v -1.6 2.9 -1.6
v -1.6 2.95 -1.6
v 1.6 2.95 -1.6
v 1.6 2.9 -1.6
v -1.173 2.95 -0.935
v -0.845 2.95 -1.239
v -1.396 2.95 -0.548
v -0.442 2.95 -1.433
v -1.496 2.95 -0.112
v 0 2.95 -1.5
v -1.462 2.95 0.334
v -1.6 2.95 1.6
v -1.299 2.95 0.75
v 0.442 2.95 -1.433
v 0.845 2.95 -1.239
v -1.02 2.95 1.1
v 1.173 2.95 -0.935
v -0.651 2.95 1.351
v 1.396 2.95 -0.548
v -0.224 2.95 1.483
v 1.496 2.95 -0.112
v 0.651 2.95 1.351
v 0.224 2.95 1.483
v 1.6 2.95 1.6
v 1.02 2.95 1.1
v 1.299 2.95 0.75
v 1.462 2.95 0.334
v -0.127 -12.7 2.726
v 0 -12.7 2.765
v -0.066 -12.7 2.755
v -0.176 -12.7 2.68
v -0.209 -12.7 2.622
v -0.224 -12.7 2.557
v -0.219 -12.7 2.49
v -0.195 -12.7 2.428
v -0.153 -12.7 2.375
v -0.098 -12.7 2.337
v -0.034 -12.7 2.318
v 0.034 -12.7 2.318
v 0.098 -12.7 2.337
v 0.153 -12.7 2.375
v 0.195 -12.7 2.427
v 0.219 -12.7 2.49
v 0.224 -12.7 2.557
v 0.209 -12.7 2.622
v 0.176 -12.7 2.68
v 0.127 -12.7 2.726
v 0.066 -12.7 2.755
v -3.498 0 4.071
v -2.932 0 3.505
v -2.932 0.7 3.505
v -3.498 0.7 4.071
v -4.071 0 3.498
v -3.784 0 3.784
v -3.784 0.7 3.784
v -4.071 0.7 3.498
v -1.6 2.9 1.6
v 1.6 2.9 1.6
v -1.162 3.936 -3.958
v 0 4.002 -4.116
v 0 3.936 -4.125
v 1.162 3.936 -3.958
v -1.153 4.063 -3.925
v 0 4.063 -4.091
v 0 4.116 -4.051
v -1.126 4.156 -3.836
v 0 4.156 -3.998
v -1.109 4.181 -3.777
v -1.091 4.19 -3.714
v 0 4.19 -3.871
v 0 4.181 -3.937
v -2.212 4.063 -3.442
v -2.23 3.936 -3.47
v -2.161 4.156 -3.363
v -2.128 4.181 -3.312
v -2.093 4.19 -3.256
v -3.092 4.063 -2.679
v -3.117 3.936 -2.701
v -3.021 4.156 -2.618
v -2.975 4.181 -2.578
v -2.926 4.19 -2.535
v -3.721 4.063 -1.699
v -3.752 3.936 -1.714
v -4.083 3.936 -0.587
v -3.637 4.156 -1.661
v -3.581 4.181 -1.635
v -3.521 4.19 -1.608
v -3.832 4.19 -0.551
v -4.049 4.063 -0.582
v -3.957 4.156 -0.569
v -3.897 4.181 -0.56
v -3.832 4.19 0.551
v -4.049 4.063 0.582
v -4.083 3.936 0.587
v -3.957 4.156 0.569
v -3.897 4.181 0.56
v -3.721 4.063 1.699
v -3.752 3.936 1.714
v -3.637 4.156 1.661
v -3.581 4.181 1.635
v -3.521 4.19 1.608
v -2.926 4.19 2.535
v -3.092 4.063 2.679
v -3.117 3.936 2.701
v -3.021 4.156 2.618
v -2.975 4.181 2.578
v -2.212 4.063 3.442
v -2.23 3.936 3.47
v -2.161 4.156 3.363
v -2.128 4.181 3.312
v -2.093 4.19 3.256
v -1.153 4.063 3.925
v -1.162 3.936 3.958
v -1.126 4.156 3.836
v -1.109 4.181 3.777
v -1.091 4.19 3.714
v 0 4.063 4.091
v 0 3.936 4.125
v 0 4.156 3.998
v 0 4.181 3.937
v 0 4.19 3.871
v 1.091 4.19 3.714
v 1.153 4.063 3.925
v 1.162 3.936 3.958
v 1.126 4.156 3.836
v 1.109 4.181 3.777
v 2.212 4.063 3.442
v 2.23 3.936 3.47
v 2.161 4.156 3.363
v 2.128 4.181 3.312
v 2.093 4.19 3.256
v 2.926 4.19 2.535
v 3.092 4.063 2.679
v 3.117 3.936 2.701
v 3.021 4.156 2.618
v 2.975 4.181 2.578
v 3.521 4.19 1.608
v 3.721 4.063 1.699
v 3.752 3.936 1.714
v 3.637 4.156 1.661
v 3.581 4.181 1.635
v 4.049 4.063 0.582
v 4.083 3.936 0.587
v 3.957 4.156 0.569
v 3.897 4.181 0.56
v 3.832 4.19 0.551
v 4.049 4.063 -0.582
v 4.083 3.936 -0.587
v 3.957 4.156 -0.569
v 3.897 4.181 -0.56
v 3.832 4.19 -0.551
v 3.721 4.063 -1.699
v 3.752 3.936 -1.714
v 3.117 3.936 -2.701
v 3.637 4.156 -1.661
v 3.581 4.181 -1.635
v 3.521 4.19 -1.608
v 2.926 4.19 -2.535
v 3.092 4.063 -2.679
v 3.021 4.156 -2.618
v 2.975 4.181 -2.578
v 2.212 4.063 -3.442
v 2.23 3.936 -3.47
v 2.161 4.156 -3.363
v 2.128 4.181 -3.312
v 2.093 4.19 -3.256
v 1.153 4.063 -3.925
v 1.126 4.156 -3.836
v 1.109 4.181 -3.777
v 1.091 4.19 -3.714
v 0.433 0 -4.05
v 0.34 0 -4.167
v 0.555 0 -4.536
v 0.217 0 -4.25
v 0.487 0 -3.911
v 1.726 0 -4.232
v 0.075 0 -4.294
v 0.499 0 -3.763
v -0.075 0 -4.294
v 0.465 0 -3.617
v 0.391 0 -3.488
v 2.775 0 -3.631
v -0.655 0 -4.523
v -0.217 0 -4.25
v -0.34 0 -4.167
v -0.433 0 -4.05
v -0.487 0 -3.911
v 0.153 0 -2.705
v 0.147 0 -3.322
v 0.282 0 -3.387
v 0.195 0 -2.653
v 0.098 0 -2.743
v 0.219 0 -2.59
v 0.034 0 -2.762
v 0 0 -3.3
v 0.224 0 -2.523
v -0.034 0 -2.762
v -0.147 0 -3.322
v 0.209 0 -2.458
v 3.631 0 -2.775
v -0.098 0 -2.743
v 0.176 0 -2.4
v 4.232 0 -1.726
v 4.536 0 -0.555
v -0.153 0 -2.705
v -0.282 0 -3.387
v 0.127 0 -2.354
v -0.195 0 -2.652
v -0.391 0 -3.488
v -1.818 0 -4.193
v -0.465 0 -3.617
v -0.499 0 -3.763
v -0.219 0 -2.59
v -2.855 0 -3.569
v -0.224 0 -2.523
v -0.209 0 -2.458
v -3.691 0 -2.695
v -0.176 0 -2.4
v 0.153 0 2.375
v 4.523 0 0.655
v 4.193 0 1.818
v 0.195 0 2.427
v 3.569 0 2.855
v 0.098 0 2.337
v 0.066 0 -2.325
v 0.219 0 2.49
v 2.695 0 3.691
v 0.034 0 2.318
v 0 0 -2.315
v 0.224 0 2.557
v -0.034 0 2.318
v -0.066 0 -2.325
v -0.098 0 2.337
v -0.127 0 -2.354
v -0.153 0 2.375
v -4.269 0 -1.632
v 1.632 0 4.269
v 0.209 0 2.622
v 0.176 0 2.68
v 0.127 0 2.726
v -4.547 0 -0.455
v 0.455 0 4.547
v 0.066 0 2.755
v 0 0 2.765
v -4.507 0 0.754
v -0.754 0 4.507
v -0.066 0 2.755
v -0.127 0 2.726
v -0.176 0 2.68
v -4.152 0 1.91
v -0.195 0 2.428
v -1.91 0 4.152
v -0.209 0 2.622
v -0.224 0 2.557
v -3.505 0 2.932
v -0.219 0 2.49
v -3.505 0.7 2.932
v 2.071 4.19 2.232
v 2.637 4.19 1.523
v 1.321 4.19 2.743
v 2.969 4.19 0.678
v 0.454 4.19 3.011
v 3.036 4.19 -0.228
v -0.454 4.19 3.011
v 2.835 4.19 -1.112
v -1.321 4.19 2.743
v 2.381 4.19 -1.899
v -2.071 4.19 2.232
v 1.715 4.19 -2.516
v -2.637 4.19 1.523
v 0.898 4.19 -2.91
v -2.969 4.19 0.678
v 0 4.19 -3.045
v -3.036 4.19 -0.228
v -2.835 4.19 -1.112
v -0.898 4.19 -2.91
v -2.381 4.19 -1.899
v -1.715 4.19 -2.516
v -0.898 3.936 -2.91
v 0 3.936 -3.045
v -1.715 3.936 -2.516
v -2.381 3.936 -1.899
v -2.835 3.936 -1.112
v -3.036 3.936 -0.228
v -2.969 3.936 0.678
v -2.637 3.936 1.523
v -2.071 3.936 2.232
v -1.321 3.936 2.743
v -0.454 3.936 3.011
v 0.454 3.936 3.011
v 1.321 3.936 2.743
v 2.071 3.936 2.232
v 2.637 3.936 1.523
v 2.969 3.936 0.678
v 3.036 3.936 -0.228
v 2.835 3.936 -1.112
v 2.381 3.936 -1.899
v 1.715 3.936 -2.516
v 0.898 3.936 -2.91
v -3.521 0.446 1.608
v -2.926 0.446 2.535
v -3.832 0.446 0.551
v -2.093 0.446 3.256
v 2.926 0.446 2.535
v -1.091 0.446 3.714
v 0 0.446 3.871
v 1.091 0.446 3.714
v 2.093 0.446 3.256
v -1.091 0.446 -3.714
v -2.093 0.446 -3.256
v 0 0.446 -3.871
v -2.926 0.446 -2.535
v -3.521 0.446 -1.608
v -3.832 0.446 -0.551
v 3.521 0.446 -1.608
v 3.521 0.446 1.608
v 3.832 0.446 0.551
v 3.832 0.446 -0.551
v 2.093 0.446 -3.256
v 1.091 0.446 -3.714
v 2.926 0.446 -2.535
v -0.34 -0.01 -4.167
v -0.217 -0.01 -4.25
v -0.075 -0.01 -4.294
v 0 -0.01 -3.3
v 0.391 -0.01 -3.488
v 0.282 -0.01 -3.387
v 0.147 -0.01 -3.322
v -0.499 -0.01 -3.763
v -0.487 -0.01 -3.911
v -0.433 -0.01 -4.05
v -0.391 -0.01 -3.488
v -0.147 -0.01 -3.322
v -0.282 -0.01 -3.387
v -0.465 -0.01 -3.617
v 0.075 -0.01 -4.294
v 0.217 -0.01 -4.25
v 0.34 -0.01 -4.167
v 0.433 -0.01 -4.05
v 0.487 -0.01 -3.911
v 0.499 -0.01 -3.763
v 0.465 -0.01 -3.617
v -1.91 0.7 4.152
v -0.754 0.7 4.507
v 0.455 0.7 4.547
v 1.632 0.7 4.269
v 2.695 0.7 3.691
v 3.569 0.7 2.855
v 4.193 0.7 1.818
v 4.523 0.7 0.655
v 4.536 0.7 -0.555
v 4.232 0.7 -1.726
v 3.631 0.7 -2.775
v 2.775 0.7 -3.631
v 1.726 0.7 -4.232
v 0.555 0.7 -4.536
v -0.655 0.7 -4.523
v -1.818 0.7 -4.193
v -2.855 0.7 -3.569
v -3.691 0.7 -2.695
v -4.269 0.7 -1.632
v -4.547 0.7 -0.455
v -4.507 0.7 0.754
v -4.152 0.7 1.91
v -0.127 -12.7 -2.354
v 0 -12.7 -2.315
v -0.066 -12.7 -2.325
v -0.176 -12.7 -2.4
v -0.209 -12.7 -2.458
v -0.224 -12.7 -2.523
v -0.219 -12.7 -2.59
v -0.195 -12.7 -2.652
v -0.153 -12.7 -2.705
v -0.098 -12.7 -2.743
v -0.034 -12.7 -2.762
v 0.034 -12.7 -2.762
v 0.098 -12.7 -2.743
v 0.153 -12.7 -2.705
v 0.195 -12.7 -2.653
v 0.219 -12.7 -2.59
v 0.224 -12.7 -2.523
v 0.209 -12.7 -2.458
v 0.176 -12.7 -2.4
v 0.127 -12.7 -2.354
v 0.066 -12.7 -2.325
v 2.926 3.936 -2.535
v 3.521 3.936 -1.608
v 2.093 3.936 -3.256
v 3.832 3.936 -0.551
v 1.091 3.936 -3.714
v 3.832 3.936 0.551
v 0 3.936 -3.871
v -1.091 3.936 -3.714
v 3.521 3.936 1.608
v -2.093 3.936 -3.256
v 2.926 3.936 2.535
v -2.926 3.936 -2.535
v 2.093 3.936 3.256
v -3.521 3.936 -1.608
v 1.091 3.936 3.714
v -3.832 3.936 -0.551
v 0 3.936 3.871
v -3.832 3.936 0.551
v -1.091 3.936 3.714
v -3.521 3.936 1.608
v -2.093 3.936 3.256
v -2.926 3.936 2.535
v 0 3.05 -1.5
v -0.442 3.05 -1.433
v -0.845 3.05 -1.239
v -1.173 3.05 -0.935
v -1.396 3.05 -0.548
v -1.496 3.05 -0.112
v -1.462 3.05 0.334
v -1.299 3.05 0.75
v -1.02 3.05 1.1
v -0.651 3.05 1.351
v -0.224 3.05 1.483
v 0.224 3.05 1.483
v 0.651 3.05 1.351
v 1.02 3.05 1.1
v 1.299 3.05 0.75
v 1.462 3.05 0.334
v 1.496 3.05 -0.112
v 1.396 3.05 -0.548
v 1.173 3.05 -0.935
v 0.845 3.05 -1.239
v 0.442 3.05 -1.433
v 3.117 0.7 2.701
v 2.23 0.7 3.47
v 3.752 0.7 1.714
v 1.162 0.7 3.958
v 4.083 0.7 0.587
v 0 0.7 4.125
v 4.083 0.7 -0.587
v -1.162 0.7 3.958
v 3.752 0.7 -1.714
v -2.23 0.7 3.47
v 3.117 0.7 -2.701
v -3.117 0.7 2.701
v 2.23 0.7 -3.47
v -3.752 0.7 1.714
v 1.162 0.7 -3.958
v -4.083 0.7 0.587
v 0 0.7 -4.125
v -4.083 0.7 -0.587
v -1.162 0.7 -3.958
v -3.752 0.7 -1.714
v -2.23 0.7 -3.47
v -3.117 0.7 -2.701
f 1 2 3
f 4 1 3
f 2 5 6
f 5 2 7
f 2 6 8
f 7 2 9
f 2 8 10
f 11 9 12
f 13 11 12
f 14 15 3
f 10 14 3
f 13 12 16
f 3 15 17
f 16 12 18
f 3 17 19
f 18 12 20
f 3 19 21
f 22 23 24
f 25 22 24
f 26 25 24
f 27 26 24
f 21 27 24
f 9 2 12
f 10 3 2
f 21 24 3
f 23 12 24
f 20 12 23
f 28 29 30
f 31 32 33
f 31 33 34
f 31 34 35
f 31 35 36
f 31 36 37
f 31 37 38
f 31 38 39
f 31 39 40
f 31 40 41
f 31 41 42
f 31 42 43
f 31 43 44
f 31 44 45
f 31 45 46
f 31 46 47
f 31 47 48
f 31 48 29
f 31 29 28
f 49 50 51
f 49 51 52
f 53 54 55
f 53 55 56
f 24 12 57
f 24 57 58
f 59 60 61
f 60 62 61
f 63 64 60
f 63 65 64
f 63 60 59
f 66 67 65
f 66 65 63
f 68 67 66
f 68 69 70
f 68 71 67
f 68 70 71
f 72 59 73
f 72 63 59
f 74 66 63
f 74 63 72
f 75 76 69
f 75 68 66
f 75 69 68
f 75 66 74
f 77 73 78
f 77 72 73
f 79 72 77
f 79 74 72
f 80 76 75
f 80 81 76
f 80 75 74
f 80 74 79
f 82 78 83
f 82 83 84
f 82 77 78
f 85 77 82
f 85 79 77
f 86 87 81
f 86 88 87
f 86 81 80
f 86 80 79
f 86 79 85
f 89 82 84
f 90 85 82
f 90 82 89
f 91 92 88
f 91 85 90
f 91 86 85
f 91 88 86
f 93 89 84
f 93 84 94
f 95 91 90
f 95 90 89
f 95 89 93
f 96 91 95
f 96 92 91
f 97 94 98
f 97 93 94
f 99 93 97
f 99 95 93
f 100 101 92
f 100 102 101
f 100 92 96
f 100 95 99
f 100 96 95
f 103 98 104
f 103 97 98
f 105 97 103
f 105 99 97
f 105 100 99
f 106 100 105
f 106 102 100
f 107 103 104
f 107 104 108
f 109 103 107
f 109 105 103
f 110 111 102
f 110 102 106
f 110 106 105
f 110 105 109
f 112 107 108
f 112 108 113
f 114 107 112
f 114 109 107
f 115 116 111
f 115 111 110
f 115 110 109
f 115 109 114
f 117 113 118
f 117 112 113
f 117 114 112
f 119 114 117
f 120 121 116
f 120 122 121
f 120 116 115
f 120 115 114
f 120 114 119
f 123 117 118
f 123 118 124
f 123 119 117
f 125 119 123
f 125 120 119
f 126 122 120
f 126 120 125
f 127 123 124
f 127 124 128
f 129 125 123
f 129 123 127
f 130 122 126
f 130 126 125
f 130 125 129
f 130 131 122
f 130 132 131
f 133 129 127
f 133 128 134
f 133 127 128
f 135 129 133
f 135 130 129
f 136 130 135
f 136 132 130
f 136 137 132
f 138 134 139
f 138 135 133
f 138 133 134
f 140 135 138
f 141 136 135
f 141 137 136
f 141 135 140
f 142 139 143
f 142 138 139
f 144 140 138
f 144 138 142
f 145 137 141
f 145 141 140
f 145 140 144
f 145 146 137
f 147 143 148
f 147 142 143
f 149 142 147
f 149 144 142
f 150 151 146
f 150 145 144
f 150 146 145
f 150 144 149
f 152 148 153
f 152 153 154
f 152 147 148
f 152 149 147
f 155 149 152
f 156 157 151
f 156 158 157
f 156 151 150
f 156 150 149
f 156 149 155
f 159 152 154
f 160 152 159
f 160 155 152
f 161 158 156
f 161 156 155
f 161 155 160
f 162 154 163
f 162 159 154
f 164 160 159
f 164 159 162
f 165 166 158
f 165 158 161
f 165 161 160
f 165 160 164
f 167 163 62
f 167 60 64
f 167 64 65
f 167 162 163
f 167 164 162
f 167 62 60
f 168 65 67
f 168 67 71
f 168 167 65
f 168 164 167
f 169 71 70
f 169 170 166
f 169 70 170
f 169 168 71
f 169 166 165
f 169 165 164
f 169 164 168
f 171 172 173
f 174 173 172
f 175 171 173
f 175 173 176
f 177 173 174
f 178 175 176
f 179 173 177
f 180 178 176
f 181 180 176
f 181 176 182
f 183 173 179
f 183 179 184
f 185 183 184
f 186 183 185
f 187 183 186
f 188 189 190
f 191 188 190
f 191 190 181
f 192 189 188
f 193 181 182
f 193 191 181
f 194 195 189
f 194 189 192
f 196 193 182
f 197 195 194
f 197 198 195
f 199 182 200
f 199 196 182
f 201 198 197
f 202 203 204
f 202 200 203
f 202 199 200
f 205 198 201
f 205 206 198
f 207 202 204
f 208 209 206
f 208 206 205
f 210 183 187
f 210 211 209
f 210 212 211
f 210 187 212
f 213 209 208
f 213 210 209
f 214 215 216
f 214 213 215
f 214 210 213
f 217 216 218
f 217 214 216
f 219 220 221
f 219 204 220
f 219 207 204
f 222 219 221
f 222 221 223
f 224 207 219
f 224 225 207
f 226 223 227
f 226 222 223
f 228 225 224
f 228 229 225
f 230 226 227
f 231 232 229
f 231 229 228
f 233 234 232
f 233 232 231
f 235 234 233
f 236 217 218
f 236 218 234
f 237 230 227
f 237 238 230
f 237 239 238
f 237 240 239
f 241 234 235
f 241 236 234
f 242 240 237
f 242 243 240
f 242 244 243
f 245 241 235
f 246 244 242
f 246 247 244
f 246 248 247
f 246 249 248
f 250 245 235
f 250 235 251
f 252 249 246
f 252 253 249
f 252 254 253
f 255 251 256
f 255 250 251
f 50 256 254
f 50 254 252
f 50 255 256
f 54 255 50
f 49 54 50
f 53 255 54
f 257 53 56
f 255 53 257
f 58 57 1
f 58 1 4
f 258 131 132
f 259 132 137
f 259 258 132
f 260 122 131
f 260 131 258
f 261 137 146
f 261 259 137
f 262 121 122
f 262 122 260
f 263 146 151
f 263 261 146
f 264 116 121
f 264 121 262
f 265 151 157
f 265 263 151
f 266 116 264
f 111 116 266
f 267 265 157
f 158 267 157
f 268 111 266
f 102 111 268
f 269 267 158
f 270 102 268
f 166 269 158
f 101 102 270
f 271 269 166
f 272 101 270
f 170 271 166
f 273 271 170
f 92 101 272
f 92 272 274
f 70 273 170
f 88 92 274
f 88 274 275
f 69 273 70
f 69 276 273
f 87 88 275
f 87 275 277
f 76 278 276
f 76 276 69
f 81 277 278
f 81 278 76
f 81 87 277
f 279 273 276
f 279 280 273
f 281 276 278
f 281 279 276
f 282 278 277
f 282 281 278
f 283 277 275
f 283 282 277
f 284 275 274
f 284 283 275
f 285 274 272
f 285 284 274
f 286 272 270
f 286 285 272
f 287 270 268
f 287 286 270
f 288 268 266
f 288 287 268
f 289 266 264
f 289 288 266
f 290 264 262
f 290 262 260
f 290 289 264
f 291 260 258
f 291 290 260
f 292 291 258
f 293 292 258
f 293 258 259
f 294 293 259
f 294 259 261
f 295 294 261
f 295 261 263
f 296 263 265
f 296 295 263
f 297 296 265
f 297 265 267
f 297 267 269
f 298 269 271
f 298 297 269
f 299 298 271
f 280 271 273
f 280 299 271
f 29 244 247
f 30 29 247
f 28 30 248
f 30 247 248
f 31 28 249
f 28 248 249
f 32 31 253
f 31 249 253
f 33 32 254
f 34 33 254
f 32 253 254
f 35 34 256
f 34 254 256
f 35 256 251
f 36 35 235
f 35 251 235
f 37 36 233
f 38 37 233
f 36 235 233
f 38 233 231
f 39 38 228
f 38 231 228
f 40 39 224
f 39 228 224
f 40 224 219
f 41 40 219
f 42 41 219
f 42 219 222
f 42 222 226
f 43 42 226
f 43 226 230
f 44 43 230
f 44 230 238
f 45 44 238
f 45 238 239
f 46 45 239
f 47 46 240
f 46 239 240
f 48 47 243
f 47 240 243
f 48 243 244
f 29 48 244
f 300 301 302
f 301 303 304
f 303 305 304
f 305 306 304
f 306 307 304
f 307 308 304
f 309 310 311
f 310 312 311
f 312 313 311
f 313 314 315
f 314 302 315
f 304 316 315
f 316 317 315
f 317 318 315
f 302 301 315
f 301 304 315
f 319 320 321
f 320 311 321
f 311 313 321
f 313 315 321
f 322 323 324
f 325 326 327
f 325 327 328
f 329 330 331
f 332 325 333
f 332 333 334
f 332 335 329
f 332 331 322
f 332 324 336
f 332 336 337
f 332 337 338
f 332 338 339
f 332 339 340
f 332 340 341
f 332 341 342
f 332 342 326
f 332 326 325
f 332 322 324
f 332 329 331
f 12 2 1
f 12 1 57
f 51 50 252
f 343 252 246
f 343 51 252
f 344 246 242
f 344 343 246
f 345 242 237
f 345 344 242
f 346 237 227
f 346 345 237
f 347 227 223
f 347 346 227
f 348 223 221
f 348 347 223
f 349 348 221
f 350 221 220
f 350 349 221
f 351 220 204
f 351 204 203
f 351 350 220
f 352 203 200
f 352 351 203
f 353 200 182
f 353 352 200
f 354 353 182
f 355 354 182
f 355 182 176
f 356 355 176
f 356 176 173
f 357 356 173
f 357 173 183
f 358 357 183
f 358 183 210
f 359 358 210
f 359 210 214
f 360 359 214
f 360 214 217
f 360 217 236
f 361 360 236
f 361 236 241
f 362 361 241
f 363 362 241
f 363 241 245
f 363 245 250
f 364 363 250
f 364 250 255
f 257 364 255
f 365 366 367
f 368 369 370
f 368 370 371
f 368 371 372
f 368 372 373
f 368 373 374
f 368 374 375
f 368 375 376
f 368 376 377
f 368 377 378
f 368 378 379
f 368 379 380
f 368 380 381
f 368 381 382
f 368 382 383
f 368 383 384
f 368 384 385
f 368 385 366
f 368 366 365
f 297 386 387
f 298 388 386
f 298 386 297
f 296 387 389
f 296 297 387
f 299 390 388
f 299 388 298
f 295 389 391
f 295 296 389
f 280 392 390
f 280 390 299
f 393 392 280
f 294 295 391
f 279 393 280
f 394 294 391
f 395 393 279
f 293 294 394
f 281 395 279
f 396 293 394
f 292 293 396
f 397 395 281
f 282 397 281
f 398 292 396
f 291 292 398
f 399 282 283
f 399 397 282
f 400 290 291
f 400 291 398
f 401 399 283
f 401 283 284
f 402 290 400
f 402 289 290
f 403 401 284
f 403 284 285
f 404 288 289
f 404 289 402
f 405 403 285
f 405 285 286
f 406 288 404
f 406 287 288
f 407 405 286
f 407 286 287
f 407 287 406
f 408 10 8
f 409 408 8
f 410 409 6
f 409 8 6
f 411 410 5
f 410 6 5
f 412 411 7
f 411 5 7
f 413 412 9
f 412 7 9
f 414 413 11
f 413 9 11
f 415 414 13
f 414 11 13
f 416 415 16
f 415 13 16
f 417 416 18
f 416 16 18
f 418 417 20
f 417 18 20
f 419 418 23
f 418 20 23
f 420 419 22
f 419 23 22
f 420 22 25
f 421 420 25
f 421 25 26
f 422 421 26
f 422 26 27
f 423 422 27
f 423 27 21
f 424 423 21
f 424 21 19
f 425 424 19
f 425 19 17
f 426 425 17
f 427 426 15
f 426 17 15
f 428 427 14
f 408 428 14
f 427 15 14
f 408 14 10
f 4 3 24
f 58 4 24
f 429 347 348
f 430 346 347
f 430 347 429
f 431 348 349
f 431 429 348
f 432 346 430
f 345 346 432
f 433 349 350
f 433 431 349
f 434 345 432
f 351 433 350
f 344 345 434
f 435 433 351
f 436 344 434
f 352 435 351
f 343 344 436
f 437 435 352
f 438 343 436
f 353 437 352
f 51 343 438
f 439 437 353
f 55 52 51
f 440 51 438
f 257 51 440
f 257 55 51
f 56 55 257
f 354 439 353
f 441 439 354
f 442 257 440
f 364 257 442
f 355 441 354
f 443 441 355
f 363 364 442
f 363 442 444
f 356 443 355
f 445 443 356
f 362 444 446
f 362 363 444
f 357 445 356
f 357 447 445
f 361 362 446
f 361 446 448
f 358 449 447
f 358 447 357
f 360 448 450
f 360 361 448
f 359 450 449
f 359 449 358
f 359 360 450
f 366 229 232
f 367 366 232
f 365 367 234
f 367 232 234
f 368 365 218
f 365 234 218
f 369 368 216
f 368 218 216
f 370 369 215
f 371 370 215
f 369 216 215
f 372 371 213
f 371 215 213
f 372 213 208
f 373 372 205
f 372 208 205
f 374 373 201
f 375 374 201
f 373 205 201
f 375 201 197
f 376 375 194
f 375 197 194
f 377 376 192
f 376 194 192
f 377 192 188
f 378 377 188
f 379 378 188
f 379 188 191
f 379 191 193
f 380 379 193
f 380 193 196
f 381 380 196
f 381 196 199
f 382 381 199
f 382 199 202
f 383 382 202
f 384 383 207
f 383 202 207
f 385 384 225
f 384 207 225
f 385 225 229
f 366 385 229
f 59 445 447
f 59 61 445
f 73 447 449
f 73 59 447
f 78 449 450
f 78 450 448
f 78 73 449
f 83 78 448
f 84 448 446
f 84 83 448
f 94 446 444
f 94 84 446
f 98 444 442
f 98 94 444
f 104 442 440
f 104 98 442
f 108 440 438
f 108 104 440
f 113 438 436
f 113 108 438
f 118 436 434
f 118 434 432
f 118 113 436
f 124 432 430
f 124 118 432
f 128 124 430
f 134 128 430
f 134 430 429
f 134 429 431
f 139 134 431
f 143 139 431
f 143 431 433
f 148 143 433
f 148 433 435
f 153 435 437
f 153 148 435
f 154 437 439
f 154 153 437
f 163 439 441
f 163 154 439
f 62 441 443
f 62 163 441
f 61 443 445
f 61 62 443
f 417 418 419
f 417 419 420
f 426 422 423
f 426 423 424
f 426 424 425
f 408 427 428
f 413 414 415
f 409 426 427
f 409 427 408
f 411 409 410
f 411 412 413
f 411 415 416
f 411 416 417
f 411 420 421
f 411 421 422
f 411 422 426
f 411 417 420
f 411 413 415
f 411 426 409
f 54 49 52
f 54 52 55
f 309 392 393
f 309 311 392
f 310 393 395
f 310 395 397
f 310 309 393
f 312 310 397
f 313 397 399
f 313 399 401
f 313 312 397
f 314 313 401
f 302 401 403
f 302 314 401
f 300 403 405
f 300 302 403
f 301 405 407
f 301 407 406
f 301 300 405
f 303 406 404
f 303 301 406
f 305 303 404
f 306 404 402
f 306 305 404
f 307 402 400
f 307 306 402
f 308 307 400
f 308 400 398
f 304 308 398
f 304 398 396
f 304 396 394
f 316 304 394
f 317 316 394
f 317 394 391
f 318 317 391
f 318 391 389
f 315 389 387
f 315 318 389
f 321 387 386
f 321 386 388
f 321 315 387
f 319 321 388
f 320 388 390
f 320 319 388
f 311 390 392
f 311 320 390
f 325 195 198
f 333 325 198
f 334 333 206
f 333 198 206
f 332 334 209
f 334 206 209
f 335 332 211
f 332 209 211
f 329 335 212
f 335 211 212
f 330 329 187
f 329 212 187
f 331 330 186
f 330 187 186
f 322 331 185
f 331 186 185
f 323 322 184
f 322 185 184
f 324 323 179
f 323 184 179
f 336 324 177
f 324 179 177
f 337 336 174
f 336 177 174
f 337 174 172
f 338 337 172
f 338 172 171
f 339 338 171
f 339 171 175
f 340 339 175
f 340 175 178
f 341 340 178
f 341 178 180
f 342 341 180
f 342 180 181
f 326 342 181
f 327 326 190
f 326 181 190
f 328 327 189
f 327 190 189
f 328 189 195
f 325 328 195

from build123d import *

# Parameters (mm, degrees)
SKETCH2_R           = 4.57
BOSS_EXTRUDE1_DEPTH = 0.446
BOSS_EXTRUDE8_DEPTH = 0.7
BOSS_EXTRUDE2_START = -2.95
SKETCH3_W           = 3.2
SKETCH3_H           = 3.2
BOSS_EXTRUDE2_DEPTH = 0.05
SKETCH8_R           = 1.5
BOSS_EXTRUDE6_DEPTH = 0.1
SKETCH5_R           = 0.225
BOSS_EXTRUDE4_DEPTH = 12.7
SKETCH9_R           = 0.5
BOSS_EXTRUDE7_DEPTH = 0.01


with BuildPart() as part:
    # Sketch1 → Revolve-Thin2 (revolve)
    with BuildSketch(Plane.XY, mode=Mode.PRIVATE) as revolve_thin2_sk:
        with BuildLine():
            Line((4.57, 0), (4.57, 0.7))
            Line((4.57, 0.7), (4.125, 0.7))
            Line((4.125, 0.7), (4.125, 3.936))
            ThreePointArc((4.125, 3.936), (4.050605122, 4.115605122), (3.871, 4.19))
            Line((3.871, 4.19), (3.045, 4.19))
            Line((3.045, 4.19), (3.045, 3.936))
            Line((3.045, 3.936), (3.871, 3.936))
            Line((3.871, 3.936), (3.871, 0.446))
            Line((3.871, 0.446), (4.316, 0.446))
            Line((4.316, 0.446), (4.316, 0))
            Line((4.316, 0), (4.57, 0))
        make_face()
    revolve(revolve_thin2_sk.sketch.rotate(Axis((0, 0, 0), (0, 1, 0)), 90), axis=Axis((0, 0, 0), (0, 1, 0)))  # turned: the seam where the file's is

    # Sketch2 → Boss-Extrude1 (add)
    with BuildSketch(Plane.XZ):
        with Locations(Location((0, 0, 0), (0, 0, 270))):  # turned: the seam where the file's is
            Circle(SKETCH2_R)
    extrude(amount=-BOSS_EXTRUDE1_DEPTH)

    # Sketch11 → Boss-Extrude8 (add)
    with BuildSketch(Plane.XZ):
        with BuildLine():
            Line((-3.498070528, 4.070827021), (-3.784448774, 3.784448774))
            Line((-3.784448774, 3.784448774), (-4.070827021, 3.498070528))
            Line((-4.070827021, 3.498070528), (-3.505141596, 2.932385103))
            ThreePointArc((-3.505141596, 2.932385103), (-3.23147799, 3.23147799), (-2.932385103, 3.505141596))
            Line((-2.932385103, 3.505141596), (-3.498070528, 4.070827021))
        make_face()
    extrude(amount=-BOSS_EXTRUDE8_DEPTH)

    # Sketch5 → Boss-Extrude4 (add)
    with BuildSketch(Plane.XZ):
        with Locations(Location((0, -2.54, 0), (0, 0, 90))):  # turned: the seam where the file's is
            Circle(SKETCH5_R)
        with Locations(Location((0, 2.54, 0), (0, 0, 90))):  # turned: the seam where the file's is
            Circle(SKETCH5_R)
    extrude(amount=BOSS_EXTRUDE4_DEPTH)

    # Sketch9 → Boss-Extrude7 (add)
    with BuildSketch(Plane.XZ):
        with Locations(Location((0, -3.8, 0), (0, 0, 90))):  # turned: the seam where the file's is
            Circle(SKETCH9_R)
    extrude(amount=BOSS_EXTRUDE7_DEPTH)


with BuildPart() as body_2:
    # Sketch3 → Boss-Extrude2 (new body)
    with BuildSketch(Plane.XZ.offset(BOSS_EXTRUDE2_START)):
        Rectangle(SKETCH3_W, SKETCH3_H)
    extrude(amount=BOSS_EXTRUDE2_DEPTH)

    # Sketch8 → Boss-Extrude6 (add)
    with BuildSketch(Plane(origin=(0, 2.95, 0), x_dir=(-1, 0, 0), z_dir=(0, 1, 0))):
        with Locations(Location((0, 0, 0), (0, 0, 270))):  # turned: the seam where the file's is
            Circle(SKETCH8_R)
    extrude(amount=BOSS_EXTRUDE6_DEPTH)


solid = Compound([part.part, body_2.part])
